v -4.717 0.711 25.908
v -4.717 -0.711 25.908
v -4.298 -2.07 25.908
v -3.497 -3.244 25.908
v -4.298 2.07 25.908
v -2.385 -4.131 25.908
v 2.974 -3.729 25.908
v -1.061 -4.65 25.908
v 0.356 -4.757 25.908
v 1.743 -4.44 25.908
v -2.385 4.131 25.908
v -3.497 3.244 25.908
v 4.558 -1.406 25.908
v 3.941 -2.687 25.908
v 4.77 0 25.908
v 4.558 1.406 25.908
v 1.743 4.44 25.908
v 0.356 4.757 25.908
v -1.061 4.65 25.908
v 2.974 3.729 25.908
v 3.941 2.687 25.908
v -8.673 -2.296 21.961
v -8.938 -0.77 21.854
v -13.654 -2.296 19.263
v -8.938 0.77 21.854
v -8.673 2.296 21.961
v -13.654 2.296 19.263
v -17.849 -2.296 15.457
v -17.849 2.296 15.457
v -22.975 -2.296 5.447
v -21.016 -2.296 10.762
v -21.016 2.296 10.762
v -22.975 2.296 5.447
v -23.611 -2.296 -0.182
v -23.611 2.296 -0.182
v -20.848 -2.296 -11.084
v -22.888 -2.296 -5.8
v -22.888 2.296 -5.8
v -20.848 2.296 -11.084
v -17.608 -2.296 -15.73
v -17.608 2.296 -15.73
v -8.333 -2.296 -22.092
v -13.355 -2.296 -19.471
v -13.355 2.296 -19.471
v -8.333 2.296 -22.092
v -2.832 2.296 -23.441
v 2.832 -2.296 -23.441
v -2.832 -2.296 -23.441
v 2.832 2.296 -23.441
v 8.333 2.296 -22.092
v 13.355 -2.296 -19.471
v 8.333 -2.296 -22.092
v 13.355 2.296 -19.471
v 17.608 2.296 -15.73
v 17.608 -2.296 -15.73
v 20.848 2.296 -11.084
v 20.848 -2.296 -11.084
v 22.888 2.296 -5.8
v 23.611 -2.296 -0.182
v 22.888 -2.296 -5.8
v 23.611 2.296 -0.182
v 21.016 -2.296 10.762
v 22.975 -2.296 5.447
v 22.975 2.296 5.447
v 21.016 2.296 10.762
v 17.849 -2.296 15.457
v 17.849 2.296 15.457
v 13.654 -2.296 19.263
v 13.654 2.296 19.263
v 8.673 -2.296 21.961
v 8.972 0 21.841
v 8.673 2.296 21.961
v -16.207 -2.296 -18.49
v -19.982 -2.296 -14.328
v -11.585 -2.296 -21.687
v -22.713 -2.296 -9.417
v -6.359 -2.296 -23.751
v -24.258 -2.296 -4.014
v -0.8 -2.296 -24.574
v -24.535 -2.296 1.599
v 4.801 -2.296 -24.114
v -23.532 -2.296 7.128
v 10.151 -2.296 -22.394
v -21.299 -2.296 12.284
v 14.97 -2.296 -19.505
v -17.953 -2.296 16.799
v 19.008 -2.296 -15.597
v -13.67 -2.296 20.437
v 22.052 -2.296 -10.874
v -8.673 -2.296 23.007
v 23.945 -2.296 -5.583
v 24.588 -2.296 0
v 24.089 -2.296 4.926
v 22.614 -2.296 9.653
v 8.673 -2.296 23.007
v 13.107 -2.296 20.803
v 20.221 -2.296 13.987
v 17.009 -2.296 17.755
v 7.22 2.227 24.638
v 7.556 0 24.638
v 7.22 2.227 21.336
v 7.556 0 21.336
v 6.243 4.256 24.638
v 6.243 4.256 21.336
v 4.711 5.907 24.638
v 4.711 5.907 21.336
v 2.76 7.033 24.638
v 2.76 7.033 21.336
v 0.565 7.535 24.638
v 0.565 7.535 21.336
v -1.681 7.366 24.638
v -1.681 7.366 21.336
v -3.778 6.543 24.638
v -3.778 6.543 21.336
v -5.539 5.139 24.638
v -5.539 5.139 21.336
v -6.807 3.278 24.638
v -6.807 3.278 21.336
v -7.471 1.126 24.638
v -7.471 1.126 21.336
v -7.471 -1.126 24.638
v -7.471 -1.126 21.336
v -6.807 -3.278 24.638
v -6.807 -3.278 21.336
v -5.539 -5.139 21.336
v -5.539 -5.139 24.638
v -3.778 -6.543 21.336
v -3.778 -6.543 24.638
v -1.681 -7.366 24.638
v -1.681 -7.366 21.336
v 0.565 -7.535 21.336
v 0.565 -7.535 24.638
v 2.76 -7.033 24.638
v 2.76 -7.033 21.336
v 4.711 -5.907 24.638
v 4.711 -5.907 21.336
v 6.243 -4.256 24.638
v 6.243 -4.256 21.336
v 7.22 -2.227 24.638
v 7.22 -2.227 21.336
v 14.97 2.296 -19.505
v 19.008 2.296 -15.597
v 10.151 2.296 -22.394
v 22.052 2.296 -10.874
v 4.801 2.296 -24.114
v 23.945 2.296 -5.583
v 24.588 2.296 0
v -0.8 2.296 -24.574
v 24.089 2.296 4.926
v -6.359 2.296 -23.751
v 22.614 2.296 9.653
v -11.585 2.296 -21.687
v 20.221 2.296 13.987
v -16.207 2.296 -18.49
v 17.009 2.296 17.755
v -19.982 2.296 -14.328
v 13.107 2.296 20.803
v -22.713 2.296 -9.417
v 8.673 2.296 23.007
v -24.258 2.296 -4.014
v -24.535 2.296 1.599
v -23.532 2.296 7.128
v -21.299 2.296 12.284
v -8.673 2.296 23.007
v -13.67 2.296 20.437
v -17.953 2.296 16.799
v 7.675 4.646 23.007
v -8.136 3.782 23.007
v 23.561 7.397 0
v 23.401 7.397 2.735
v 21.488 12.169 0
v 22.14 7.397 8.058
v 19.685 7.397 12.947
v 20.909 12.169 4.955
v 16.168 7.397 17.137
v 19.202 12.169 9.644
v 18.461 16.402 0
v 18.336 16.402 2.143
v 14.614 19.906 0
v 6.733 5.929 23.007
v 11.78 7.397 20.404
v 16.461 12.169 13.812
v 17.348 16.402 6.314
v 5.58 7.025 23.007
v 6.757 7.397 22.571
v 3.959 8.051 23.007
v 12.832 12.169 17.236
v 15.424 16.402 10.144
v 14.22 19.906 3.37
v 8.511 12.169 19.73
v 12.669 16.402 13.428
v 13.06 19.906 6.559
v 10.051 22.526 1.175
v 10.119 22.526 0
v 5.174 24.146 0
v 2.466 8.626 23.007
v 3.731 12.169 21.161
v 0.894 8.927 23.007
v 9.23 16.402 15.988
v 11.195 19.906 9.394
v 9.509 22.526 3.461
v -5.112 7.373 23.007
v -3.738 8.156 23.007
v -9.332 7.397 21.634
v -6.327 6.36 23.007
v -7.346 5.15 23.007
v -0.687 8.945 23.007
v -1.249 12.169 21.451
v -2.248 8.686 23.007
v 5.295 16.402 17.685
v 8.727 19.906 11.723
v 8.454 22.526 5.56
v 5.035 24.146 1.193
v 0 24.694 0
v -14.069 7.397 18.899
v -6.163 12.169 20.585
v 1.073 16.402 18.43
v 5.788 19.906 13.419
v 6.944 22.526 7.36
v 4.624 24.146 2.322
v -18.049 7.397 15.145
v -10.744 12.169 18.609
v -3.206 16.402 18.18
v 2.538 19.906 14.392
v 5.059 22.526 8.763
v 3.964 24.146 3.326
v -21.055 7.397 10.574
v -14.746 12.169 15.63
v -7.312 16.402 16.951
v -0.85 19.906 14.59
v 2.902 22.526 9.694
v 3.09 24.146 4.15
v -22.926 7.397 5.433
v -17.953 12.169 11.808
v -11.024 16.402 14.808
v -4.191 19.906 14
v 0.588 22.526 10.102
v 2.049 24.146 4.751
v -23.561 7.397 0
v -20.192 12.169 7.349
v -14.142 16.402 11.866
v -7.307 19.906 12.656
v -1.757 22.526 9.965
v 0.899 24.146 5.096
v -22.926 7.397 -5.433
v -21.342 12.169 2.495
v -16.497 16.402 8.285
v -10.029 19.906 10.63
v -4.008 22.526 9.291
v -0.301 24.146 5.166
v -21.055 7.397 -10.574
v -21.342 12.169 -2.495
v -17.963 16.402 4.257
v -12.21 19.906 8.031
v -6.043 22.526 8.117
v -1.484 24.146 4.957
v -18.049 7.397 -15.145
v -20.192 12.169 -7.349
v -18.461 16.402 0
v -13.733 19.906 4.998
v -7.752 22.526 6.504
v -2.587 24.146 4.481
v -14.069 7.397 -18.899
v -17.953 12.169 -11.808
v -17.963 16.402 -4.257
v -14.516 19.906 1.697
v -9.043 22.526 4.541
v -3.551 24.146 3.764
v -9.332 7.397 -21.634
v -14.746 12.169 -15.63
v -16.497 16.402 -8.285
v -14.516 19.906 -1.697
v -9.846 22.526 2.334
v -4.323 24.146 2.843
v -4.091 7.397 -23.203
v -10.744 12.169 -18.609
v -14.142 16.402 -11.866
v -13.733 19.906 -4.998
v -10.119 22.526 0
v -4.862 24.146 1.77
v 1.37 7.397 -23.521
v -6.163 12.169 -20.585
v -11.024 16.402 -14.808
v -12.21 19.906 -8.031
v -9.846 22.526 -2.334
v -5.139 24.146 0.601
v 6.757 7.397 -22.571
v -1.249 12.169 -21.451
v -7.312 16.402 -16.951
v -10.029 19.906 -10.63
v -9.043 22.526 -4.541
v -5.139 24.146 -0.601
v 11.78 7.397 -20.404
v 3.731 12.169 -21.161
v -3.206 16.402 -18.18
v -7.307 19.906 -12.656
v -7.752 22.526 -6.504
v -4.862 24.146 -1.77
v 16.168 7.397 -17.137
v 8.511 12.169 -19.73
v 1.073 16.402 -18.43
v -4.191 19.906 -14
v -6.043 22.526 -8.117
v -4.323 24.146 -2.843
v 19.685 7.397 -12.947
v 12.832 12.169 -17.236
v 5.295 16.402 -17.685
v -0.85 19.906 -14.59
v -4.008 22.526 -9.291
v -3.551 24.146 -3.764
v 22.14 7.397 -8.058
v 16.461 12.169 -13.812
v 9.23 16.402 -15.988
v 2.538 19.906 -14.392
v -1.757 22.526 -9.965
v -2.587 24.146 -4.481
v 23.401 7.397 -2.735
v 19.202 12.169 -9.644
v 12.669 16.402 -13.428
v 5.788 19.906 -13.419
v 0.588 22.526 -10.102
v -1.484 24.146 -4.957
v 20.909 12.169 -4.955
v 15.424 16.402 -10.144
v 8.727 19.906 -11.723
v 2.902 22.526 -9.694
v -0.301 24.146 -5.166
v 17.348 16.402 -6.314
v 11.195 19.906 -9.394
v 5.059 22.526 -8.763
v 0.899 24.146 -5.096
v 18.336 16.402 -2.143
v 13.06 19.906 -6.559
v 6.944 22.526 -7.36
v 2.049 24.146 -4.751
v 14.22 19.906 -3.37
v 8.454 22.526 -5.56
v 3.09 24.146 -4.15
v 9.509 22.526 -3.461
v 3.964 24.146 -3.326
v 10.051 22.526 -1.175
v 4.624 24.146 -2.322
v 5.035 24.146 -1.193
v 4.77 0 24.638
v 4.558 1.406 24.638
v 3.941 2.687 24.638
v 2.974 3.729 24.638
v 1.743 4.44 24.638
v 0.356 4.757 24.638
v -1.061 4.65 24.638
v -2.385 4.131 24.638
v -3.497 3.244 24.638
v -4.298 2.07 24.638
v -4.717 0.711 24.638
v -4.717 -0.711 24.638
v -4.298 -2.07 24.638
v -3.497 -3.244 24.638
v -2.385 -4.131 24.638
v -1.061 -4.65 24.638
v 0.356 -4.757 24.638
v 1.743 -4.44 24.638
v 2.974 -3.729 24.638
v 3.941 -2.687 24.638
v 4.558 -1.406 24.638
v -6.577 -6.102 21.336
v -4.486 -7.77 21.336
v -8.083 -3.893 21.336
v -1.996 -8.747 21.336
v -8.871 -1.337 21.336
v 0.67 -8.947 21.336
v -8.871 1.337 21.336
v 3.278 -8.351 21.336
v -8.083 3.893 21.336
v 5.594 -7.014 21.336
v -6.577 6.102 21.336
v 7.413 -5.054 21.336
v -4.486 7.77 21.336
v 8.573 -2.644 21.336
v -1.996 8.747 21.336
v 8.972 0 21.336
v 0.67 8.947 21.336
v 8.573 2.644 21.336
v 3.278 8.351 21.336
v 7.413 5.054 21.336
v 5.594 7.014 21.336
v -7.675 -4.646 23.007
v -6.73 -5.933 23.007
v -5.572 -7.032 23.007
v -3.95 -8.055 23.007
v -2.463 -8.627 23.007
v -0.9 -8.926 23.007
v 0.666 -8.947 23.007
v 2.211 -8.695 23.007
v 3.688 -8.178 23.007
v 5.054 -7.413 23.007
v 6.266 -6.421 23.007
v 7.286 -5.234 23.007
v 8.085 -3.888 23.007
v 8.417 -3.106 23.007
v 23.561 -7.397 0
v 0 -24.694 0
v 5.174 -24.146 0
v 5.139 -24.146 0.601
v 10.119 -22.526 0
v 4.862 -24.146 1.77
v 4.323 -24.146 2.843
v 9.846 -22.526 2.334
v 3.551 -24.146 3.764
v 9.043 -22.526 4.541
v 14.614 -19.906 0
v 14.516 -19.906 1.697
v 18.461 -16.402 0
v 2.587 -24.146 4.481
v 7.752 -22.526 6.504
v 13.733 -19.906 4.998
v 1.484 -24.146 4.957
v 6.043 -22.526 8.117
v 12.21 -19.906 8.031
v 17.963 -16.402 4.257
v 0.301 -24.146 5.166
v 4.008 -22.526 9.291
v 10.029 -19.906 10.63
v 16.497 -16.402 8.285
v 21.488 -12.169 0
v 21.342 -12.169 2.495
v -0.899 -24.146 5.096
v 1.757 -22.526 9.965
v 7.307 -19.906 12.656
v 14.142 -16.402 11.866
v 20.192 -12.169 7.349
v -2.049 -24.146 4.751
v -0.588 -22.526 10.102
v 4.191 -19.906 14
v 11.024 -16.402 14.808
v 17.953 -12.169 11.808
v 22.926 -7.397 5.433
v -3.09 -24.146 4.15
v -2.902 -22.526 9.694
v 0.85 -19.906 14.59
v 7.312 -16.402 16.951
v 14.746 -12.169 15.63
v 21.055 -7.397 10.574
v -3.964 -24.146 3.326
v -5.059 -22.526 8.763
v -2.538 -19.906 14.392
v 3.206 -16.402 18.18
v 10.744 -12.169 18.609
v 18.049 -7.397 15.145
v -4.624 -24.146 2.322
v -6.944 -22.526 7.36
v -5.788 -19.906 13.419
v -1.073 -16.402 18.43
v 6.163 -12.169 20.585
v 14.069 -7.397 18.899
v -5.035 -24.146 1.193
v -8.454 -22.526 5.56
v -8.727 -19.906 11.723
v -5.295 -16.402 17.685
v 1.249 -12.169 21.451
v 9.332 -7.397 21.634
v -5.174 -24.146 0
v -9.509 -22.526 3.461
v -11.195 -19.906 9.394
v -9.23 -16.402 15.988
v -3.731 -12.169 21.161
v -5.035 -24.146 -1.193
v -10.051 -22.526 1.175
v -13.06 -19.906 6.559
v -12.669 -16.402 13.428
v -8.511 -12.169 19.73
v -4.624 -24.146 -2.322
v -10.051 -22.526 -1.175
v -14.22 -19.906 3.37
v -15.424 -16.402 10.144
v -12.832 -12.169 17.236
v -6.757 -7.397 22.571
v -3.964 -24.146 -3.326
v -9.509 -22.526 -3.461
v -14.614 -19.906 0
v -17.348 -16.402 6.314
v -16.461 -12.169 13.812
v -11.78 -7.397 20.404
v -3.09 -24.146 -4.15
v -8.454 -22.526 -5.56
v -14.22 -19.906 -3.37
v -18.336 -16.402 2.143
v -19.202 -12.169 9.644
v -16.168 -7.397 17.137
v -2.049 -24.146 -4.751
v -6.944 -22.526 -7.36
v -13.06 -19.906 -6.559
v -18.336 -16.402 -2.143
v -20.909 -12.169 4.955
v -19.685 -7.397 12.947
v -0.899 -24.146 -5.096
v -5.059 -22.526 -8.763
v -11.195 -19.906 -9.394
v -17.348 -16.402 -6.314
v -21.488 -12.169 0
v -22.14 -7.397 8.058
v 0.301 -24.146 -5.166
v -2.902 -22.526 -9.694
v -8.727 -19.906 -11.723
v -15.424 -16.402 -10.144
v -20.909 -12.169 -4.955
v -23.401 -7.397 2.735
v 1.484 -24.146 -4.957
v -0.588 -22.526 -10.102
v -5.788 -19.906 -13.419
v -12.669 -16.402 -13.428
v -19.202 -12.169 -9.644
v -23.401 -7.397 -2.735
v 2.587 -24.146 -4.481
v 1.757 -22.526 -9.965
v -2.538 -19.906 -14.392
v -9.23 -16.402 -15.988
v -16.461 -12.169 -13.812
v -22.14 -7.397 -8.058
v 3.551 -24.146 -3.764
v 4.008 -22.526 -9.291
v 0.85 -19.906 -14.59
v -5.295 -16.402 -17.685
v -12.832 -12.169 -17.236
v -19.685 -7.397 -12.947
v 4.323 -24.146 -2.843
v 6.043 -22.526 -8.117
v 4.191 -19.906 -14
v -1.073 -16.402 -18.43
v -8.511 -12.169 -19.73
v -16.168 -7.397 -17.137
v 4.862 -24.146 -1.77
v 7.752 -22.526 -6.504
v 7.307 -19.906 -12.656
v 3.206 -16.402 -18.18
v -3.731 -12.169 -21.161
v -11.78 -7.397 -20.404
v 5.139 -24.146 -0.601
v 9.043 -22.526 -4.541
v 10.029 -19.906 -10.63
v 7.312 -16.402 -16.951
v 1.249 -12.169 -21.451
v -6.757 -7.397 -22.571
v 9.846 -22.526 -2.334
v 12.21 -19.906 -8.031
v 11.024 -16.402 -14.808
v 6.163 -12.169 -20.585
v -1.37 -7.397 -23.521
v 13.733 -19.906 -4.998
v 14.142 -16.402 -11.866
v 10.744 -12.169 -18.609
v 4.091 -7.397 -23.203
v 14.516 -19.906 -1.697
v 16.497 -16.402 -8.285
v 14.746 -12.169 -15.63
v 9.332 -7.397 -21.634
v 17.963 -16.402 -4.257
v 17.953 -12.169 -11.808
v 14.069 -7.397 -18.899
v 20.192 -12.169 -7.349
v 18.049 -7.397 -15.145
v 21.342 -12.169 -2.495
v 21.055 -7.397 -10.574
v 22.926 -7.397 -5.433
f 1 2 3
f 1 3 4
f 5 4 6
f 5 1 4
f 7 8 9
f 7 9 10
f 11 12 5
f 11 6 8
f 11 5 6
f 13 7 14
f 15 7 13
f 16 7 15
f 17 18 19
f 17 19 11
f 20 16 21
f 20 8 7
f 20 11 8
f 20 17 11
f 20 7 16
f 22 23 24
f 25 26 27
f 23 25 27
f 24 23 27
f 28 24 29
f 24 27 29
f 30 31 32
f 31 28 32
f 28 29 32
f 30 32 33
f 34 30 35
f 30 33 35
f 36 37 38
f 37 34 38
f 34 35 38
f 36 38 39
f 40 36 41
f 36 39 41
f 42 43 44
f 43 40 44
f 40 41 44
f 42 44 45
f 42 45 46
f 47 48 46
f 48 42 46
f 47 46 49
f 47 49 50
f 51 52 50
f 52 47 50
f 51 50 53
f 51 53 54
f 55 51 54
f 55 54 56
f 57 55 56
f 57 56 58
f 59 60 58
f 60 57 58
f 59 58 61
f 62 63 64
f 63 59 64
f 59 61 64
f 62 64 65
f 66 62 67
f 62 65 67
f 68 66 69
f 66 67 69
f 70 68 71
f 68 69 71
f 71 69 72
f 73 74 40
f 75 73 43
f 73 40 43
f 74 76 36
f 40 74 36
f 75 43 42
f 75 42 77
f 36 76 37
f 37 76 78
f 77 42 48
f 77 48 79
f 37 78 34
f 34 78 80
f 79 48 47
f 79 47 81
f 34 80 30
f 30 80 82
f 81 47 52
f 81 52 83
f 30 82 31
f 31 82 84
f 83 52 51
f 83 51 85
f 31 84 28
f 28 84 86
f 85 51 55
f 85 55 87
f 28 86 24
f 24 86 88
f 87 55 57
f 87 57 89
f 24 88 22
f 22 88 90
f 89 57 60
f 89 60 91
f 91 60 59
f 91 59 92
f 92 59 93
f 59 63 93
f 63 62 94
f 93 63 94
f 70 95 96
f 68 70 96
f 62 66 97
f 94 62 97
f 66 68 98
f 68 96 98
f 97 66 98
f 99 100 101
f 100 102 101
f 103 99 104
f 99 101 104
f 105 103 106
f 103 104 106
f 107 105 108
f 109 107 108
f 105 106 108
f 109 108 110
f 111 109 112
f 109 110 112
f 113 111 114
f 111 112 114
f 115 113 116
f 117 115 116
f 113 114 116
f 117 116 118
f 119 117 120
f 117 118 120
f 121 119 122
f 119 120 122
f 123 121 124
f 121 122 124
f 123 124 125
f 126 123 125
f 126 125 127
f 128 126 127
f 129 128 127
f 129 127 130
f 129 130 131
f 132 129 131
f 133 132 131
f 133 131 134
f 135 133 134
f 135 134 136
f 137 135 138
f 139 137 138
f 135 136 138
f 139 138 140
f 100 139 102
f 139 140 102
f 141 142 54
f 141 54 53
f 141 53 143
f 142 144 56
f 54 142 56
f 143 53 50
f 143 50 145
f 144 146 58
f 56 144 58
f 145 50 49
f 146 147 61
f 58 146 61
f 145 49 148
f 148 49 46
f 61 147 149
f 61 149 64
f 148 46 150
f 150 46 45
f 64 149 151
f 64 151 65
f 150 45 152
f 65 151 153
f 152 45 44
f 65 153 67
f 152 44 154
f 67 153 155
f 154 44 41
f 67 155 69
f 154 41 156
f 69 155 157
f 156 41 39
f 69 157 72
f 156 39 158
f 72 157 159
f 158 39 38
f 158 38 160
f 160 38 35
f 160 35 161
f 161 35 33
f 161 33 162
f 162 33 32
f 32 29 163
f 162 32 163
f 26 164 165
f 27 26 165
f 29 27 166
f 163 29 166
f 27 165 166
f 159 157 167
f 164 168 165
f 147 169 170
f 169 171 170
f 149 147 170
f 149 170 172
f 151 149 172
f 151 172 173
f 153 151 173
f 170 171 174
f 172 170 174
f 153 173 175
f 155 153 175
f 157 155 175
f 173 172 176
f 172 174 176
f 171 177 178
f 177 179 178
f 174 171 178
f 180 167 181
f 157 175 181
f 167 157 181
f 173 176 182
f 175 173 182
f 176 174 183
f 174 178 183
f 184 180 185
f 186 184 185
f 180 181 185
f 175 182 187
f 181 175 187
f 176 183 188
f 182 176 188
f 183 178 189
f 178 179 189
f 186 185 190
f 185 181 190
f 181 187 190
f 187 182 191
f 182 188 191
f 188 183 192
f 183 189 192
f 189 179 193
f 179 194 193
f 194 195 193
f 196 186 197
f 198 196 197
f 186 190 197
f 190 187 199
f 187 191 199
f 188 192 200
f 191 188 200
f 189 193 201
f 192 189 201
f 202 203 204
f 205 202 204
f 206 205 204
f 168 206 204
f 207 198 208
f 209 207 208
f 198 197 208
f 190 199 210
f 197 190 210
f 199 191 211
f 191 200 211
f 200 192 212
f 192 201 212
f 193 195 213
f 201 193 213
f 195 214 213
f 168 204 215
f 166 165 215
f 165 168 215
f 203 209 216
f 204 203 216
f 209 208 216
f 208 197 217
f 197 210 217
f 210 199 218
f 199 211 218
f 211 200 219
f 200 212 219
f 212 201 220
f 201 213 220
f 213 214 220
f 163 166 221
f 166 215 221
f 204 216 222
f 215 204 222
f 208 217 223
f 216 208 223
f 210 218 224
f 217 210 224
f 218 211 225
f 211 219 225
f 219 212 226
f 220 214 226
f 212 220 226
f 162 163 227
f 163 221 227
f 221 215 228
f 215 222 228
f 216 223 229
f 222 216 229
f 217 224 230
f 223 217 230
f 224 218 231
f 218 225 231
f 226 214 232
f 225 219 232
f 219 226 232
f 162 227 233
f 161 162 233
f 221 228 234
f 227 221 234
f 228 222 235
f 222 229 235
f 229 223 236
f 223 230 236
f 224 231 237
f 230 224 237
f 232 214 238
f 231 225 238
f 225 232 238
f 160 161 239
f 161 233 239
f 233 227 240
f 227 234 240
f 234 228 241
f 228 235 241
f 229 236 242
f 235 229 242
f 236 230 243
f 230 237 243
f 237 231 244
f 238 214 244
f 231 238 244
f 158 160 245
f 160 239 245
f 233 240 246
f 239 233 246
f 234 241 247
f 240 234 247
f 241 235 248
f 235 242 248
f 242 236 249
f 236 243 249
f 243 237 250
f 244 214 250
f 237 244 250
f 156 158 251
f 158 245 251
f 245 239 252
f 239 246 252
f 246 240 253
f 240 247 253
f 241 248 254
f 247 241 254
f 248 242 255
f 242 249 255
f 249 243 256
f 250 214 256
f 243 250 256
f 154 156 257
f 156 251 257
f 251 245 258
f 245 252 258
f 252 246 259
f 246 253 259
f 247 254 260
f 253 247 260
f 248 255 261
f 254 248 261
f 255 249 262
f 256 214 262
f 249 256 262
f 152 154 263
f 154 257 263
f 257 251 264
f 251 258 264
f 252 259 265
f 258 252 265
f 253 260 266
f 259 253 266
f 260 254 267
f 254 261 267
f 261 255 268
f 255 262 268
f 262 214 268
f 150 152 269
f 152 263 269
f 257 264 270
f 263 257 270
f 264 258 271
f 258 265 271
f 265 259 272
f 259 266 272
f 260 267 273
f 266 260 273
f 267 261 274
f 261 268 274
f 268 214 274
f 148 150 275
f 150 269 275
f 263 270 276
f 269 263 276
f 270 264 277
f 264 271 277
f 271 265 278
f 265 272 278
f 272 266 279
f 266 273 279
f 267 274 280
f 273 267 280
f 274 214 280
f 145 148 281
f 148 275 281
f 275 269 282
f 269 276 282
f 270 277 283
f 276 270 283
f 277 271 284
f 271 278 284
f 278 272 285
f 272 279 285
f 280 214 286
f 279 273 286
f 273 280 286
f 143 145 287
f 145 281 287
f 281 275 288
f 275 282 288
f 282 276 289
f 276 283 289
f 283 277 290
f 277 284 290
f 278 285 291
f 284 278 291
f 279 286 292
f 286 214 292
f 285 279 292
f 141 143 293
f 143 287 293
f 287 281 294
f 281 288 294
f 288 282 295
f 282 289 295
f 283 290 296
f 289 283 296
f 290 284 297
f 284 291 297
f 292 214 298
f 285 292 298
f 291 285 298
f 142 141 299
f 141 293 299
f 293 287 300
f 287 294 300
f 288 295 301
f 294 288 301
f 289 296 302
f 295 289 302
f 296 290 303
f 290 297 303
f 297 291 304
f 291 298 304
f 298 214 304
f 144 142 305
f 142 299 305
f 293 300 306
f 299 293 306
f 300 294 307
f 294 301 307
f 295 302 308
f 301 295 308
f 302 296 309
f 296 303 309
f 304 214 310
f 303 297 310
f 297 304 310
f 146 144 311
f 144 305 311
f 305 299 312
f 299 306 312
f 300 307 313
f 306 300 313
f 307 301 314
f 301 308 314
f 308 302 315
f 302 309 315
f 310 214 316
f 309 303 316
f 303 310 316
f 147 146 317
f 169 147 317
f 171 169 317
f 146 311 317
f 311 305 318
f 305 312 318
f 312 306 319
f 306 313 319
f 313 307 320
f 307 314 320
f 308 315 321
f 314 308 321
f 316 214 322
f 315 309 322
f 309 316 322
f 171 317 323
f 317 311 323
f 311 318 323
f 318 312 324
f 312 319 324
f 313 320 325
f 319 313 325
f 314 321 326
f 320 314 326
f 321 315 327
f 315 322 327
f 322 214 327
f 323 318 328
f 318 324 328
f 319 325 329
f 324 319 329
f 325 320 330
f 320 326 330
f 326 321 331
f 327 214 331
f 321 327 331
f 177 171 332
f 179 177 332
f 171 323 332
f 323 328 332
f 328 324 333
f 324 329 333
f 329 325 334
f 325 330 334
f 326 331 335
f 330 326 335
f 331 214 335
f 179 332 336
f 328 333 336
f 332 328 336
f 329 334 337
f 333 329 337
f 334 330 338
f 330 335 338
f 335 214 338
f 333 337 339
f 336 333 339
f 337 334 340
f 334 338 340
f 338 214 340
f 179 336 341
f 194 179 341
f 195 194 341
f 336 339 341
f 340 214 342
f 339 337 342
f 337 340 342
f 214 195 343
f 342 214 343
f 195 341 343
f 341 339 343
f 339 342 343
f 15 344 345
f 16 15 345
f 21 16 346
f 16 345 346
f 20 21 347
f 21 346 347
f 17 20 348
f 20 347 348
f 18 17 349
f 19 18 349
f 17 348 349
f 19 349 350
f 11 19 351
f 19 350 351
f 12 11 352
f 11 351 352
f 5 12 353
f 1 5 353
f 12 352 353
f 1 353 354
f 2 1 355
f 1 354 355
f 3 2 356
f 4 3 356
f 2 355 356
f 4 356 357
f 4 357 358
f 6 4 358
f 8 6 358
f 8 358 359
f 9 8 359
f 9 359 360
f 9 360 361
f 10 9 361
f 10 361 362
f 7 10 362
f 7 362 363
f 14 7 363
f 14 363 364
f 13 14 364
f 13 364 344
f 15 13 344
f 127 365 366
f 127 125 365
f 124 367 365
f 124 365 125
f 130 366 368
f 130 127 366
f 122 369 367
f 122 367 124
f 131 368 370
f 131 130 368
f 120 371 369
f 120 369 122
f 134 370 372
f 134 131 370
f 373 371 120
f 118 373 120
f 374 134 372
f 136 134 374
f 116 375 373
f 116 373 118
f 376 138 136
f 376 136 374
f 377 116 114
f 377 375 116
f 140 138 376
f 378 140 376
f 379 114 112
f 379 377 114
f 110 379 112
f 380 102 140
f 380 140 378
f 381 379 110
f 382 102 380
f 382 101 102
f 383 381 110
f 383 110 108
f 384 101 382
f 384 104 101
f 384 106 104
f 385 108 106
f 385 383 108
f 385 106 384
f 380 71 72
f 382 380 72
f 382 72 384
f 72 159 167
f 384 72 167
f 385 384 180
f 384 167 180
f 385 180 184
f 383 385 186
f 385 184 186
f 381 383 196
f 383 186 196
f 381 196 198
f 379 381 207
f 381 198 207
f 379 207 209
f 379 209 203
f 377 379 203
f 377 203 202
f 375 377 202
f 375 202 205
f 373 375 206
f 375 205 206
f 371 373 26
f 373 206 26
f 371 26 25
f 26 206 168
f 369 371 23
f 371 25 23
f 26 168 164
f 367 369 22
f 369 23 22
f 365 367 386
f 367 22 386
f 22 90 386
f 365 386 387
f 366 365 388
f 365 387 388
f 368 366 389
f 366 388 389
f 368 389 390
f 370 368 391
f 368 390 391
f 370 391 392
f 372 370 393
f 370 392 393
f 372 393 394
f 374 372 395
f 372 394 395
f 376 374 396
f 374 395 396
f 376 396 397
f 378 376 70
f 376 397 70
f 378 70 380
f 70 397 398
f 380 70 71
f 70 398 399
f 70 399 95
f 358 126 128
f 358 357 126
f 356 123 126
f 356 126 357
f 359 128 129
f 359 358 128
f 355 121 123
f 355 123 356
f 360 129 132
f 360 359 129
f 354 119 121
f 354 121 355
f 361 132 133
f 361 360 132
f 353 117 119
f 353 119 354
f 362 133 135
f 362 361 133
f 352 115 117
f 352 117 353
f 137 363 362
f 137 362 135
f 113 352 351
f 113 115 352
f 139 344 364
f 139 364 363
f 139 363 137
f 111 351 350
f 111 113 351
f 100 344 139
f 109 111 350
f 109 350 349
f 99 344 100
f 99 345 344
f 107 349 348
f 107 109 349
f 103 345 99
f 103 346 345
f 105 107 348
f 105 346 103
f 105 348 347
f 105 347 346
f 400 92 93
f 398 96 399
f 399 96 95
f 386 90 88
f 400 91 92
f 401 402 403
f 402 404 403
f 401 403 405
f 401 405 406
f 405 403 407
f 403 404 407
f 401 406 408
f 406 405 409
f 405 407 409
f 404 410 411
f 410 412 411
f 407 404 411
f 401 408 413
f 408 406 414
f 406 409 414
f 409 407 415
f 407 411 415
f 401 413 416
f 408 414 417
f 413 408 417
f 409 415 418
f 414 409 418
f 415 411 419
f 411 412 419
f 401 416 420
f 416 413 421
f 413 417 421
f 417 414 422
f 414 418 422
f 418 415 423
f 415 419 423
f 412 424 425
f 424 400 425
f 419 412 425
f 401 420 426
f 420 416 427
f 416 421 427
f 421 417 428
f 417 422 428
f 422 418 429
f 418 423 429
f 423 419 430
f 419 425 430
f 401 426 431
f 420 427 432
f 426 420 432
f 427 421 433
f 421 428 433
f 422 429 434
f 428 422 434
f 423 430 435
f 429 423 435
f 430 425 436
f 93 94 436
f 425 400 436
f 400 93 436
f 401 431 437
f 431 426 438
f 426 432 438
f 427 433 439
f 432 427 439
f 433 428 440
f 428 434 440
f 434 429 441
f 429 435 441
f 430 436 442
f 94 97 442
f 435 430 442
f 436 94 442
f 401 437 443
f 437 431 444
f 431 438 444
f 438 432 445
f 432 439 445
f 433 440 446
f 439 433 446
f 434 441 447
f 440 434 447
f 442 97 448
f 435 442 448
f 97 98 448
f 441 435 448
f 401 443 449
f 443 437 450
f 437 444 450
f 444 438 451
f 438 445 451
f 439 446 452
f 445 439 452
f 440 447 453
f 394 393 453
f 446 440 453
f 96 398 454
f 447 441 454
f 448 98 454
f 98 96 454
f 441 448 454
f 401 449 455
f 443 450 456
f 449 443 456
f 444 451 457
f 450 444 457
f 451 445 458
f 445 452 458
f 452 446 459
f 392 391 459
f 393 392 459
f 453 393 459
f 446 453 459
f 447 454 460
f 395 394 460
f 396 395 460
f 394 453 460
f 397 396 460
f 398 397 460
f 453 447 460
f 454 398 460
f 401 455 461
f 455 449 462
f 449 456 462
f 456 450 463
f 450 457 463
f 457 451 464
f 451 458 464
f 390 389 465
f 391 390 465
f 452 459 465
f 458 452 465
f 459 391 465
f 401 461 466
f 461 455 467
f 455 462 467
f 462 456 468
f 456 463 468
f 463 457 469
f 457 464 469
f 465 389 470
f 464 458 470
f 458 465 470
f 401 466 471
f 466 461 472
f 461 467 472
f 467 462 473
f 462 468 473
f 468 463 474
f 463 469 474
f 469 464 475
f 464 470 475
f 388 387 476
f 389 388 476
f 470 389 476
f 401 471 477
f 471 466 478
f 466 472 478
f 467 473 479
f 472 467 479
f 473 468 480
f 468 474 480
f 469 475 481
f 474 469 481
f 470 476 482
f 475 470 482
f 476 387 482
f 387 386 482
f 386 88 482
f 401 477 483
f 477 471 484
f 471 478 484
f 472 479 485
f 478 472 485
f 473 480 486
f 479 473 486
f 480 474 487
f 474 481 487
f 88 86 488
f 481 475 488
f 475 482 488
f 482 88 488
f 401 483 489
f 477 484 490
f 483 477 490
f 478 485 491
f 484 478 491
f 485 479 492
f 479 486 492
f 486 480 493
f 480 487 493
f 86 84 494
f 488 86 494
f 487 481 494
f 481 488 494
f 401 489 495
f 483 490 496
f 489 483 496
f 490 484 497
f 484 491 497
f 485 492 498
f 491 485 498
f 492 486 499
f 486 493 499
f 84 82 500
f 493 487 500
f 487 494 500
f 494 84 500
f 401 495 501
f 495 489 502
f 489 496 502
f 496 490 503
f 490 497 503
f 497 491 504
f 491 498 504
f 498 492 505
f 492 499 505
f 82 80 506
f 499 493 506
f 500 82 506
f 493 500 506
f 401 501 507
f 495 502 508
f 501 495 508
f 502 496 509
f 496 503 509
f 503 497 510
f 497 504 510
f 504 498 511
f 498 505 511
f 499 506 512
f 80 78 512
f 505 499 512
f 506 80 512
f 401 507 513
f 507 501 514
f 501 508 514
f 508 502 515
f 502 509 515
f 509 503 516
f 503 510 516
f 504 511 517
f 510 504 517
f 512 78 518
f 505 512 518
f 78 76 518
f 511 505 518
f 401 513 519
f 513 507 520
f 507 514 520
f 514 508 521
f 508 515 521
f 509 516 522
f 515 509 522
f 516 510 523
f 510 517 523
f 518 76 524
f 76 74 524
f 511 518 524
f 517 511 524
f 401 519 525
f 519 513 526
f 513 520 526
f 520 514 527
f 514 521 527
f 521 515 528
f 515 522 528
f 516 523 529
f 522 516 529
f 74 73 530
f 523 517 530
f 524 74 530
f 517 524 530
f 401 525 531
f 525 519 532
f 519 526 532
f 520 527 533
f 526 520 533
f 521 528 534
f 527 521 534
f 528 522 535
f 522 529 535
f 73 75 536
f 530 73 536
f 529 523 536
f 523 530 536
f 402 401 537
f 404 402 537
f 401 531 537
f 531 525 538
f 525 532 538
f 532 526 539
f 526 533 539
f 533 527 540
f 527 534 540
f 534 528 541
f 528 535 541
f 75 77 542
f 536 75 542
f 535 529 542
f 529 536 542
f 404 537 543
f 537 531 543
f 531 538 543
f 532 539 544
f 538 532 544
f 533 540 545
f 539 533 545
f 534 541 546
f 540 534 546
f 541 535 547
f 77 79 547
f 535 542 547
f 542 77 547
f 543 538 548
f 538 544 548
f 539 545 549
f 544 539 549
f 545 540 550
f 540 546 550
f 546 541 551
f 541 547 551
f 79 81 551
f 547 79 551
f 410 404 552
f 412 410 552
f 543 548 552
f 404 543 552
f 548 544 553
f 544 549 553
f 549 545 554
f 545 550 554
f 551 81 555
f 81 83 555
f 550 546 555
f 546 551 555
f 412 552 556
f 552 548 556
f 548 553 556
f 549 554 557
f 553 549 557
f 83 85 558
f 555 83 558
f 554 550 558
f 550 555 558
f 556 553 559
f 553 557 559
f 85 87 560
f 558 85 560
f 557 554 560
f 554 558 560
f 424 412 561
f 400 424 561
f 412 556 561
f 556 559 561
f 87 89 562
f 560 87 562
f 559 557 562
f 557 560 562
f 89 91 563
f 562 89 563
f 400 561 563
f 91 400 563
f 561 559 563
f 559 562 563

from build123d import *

# Parameters (mm, degrees)
F3_R     = 4.7700695271
F4_DEPTH = 25.908
F5_R     = 7.5557207763
F6_DEPTH = 24.638
F7_R     = 8.9716016728
F7_R_2   = 7.5557207763
F8_DEPTH = 3.302


# Not quite as in the source:
# - a feature names something its author has since deleted; it is built from what else it names


with BuildPart() as f2:
    # F0 (on Top) → F2 (revolve)
    with BuildSketch(Plane.XY):
        with BuildLine():
            Line((0, 24.6944446117), (0, -24.6944446117))
            ThreePointArc((0, -24.6944446117), (16.6301779866, -18.2552122643), (24.5875081551, -2.2956562028))
            Line((24.5875081551, -2.2956562028), (23.6113984138, -2.2956562028))
            Line((23.6113984138, -2.2956562028), (23.6113984138, 2.2956562028))
            Line((23.6113984138, 2.2956562028), (24.5875081551, 2.2956562028))
            ThreePointArc((24.5875081551, 2.2956562028), (16.6301779866, 18.2552122643), (0, 24.6944446117))
        make_face()
    revolve(axis=Axis((0, 0.329259783, 0), (0, -1, 0)))

    # F3 (on Top) → F4 (join)
    with BuildSketch(Plane.XY):
        Circle(F3_R)
    extrude(amount=F4_DEPTH)

    # F5 (on Top) → F6 (join)
    with BuildSketch(Plane.XY):
        Circle(F5_R)
    extrude(amount=F6_DEPTH)

    # F7 (on face) → F8 (cut)
    with BuildSketch(Plane.XY.offset(24.638)):
        Circle(F7_R)
        Circle(F7_R_2, mode=Mode.SUBTRACT)
    extrude(amount=-F8_DEPTH, mode=Mode.SUBTRACT)


solid = f2.part
